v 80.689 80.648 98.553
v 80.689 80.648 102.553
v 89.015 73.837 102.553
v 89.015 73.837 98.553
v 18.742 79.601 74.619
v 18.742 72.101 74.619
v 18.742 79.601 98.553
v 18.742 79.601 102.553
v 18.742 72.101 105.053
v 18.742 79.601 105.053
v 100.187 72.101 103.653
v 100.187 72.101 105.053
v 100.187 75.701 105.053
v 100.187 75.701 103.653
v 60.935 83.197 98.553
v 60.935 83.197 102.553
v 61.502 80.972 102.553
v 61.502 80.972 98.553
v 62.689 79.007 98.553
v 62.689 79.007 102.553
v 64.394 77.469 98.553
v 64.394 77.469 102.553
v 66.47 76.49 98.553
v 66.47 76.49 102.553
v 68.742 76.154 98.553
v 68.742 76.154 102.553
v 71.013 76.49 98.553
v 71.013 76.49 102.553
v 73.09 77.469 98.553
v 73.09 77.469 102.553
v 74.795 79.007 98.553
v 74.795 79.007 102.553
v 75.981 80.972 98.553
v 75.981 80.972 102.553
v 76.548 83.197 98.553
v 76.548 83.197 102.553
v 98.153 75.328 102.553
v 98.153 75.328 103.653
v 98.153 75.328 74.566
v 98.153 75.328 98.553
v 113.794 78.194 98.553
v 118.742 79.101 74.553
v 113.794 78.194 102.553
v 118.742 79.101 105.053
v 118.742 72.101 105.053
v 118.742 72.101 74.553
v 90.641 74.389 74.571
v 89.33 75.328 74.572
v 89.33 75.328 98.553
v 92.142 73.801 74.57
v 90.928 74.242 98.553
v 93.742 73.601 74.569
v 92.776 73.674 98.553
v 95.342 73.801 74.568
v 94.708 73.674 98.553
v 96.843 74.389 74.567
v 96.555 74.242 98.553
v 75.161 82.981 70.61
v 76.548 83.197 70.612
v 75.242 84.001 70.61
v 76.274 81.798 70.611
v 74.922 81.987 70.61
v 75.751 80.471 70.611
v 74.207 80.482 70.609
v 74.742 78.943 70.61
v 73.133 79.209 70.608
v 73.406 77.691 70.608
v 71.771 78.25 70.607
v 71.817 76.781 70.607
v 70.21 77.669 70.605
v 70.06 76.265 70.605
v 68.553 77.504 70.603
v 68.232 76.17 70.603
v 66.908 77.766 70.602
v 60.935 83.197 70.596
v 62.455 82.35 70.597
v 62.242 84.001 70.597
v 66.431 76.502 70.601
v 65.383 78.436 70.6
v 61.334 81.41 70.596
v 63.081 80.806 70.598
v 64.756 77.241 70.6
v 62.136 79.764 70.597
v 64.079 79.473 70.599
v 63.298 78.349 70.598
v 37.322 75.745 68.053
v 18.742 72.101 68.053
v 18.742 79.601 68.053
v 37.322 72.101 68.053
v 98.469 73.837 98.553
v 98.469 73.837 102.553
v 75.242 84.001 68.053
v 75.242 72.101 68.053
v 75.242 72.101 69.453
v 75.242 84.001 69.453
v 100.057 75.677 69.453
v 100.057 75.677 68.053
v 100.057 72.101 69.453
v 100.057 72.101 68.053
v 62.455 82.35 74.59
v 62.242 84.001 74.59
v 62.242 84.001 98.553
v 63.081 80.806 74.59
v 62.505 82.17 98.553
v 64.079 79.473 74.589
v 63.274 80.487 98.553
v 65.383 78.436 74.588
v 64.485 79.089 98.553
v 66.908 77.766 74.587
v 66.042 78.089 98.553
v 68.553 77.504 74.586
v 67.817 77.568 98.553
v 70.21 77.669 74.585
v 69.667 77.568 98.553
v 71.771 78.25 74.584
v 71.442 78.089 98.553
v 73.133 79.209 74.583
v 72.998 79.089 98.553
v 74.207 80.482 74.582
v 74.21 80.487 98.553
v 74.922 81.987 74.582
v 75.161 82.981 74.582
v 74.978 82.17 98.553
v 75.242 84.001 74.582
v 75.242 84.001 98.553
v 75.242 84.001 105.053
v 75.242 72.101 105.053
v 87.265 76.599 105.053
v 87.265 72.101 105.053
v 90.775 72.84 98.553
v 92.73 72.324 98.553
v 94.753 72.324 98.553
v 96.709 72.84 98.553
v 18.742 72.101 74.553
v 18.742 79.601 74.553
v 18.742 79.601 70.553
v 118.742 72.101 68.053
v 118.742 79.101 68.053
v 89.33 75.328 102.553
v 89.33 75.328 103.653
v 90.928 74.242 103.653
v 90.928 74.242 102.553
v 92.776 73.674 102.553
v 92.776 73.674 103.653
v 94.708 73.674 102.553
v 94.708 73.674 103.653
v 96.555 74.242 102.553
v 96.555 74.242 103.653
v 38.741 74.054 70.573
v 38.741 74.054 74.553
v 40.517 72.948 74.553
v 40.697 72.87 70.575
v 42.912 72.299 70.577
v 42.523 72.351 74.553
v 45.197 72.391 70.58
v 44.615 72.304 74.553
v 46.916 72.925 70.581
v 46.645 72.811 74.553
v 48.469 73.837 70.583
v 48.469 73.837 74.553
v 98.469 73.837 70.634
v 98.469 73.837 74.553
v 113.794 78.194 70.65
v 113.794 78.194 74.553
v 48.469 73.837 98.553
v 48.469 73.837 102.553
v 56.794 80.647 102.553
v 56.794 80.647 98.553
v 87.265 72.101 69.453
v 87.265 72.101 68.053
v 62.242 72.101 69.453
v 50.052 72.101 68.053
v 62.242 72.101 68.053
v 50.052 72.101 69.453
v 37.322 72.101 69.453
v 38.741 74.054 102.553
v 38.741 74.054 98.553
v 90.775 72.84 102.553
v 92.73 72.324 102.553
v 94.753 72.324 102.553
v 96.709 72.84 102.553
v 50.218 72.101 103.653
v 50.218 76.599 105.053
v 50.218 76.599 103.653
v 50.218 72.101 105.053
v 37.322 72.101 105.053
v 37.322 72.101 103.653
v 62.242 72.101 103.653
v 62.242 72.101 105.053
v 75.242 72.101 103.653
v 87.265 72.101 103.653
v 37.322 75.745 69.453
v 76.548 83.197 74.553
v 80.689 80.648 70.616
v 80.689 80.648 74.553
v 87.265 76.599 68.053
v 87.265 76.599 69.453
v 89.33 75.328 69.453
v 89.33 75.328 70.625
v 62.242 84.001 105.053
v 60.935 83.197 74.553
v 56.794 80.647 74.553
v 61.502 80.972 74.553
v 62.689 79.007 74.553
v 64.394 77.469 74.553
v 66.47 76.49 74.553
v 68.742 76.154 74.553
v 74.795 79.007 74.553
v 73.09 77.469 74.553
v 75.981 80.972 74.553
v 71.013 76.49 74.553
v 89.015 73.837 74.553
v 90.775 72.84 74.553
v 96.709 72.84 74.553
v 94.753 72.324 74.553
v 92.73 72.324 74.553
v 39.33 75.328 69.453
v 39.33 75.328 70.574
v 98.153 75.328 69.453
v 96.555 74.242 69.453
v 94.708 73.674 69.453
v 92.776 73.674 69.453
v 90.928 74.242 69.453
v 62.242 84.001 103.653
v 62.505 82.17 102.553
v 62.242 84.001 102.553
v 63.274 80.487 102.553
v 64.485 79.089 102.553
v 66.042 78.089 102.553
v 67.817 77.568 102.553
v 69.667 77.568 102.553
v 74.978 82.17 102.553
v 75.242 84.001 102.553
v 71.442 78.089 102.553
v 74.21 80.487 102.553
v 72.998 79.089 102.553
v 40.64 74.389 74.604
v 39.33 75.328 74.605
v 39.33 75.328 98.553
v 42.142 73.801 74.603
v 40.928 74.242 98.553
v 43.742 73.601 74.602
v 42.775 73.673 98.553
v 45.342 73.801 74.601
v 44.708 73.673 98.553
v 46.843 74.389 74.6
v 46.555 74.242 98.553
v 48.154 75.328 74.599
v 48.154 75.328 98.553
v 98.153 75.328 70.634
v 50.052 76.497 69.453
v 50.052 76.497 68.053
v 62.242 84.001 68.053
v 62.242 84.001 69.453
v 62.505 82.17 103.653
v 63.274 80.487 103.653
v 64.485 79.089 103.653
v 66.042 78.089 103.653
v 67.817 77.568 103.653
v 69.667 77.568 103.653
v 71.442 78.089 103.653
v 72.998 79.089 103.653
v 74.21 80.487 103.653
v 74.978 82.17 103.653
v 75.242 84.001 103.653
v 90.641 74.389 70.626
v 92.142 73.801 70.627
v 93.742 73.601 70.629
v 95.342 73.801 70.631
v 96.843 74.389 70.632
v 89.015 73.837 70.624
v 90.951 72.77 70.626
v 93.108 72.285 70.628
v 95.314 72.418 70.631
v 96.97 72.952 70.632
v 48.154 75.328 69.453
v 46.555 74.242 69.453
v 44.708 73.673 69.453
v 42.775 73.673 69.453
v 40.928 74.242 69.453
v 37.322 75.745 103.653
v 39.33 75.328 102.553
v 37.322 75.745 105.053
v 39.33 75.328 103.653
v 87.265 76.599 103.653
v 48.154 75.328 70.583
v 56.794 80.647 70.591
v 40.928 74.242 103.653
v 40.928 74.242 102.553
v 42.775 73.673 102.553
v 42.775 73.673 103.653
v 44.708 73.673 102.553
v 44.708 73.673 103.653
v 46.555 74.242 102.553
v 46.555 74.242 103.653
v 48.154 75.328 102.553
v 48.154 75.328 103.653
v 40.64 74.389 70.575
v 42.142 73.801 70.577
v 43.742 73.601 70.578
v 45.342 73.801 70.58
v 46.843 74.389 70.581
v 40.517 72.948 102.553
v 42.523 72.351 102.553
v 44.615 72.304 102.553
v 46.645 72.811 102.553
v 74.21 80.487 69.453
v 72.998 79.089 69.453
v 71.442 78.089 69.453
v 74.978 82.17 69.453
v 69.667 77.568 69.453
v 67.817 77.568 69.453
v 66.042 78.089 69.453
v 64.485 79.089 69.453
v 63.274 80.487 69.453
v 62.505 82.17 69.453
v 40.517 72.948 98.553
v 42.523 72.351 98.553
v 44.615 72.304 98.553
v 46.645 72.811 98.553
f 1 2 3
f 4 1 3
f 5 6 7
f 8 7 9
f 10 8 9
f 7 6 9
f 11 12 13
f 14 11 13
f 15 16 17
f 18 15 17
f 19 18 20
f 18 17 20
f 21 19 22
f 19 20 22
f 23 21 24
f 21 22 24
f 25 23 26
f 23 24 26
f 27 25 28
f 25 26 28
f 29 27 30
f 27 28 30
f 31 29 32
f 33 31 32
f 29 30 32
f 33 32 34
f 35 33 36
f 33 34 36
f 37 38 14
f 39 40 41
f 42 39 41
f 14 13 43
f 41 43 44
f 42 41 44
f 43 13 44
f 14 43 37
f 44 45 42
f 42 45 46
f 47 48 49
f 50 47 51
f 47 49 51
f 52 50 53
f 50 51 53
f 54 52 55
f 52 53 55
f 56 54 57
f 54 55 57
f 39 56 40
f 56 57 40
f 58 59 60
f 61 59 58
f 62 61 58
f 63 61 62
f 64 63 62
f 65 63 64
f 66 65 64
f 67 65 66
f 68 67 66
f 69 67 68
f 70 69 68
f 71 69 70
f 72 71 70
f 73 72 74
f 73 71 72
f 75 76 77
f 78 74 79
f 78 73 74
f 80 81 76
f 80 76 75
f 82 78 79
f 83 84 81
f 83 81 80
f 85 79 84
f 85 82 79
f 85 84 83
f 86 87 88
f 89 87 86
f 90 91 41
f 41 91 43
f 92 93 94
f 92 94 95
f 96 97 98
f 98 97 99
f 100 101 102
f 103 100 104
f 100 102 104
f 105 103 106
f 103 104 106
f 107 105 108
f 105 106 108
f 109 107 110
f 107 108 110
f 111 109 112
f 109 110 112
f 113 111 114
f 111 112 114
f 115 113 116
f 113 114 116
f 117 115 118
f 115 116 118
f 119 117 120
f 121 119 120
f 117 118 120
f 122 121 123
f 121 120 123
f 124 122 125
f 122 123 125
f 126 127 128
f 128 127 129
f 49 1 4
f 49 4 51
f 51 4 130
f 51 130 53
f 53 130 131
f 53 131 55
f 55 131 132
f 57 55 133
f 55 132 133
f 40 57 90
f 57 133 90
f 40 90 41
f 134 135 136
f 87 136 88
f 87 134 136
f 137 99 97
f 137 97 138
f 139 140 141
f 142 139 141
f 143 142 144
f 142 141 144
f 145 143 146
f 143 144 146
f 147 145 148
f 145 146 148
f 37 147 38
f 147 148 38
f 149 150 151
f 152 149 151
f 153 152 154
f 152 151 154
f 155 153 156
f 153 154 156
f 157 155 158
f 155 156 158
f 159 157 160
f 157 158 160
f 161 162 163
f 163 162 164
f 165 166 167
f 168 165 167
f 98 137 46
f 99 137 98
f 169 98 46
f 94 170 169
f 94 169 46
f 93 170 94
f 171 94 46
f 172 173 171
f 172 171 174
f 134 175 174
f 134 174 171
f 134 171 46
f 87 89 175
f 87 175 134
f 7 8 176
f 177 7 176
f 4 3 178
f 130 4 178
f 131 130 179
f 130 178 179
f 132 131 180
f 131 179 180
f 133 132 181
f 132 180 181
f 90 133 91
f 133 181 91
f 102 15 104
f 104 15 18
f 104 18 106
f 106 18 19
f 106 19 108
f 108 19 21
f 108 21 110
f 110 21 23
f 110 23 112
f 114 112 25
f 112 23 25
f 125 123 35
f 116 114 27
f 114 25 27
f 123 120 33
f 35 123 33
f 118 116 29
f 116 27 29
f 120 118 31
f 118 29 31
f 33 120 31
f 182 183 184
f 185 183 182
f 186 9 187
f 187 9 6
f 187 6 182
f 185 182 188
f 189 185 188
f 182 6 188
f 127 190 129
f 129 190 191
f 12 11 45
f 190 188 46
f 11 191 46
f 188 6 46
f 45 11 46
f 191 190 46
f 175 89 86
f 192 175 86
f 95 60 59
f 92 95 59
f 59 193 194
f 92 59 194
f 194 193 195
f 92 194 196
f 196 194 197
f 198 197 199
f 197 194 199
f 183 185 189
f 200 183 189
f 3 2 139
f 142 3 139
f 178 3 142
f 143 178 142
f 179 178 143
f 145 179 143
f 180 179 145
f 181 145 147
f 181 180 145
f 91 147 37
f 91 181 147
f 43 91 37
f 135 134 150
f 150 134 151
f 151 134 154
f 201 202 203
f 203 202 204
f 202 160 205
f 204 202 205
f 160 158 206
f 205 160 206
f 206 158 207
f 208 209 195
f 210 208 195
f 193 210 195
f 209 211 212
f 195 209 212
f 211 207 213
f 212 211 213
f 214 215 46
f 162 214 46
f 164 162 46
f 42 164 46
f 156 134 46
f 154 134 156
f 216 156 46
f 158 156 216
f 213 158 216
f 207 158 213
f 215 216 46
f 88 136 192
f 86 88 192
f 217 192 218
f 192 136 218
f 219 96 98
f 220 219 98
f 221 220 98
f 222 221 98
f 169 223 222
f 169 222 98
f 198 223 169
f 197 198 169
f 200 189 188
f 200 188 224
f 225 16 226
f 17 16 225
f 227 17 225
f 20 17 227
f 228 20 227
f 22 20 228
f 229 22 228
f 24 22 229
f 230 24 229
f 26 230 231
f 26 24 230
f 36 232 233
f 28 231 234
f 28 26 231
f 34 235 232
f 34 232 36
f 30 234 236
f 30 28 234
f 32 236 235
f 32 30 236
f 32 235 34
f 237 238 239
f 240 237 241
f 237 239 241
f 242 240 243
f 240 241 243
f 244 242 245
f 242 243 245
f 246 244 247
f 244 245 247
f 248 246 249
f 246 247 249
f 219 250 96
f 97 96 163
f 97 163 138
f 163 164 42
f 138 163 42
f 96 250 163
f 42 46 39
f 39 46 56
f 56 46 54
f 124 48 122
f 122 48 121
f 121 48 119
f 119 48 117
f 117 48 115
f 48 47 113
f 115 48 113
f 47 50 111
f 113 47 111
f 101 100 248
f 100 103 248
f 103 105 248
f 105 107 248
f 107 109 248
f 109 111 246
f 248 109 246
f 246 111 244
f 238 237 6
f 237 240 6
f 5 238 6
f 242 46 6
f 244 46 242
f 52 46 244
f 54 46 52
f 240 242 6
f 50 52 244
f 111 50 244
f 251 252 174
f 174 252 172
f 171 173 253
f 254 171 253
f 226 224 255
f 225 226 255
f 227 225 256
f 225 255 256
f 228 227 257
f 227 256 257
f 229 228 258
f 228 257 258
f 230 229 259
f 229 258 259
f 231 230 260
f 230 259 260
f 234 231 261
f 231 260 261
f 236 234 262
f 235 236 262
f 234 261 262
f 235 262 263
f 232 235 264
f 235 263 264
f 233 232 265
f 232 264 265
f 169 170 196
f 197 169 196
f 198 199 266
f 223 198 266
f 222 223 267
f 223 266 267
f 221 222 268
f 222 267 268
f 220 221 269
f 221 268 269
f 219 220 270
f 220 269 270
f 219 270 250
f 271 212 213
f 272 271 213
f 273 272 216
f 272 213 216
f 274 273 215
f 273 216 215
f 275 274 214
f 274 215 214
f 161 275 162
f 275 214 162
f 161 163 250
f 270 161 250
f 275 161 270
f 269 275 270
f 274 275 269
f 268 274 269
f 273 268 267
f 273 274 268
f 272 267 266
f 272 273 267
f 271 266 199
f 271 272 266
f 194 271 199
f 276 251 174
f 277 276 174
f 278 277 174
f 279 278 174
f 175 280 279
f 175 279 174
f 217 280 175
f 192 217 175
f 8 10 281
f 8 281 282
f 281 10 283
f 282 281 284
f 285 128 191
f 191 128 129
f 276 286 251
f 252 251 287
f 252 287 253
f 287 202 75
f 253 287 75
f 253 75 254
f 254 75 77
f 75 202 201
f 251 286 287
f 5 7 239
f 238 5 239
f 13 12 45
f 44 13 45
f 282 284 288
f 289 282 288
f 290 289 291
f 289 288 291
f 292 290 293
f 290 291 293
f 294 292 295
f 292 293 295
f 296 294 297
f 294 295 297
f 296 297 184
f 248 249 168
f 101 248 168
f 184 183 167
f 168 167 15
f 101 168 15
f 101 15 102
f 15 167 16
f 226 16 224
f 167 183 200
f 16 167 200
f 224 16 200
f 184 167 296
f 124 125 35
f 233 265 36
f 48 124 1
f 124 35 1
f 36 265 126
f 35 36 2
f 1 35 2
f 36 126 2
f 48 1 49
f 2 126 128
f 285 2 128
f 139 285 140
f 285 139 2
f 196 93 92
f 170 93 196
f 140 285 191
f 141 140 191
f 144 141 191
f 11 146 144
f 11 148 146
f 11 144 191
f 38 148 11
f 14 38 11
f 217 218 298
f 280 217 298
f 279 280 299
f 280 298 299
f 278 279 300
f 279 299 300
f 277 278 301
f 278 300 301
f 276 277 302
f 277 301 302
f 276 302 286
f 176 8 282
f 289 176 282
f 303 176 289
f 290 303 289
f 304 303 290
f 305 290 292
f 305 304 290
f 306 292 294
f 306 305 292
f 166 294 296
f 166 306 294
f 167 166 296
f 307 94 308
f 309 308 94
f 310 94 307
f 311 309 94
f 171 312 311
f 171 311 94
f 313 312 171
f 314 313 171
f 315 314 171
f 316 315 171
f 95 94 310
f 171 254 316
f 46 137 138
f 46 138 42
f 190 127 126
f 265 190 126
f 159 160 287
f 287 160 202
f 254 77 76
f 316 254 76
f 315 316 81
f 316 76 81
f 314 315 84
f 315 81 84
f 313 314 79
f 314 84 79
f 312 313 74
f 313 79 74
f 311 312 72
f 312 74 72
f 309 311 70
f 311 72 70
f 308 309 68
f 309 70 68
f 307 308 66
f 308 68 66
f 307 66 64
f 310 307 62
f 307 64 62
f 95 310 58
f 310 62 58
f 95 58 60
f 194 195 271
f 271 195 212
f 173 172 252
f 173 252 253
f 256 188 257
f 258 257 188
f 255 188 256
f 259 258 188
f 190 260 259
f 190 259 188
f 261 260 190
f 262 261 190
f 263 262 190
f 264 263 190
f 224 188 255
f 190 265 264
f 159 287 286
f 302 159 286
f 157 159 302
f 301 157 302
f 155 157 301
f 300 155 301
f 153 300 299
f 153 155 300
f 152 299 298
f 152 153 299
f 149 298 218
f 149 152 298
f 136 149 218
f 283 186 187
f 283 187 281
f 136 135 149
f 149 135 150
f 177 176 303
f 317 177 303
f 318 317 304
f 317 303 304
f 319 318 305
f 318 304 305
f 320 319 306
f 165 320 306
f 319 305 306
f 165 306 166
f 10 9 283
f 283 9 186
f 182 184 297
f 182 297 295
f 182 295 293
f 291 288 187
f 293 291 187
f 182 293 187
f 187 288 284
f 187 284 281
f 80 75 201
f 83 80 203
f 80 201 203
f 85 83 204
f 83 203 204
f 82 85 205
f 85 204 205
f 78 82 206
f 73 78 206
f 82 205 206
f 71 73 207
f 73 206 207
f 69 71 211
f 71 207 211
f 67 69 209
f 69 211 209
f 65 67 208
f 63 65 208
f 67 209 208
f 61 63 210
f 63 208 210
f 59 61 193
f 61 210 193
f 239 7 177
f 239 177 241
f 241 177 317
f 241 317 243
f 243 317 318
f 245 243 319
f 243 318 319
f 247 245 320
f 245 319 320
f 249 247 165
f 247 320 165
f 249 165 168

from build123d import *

# Parameters (mm, degrees)
SKETCH_1_W          = 100
SKETCH_1_H          = 4
EXTRUDE_1_DEPTH     = 15
EXTRUDE_1_2_DEPTH   = 15
CUT_EXTRUDE_1_DEPTH = 32
SKETCH_3_W          = 100
SKETCH_3_H          = 2.5
EXTRUDE_2_DEPTH     = 15
CUT_EXTRUDE_5_DEPTH = 37
SKETCH_5_W          = 13
SKETCH_5_H          = 11.9
CUT_EXTRUDE_6_DEPTH = 1.4
SKETCH_6_W          = 13
SKETCH_6_H          = 11.9
CUT_EXTRUDE_7_DEPTH = 1.4


with BuildPart() as part:
    # Эскиз1 → Бобышка-Вытянуть1 (new body)
    with BuildSketch(Plane(origin=(0, 72.101425994, 0), x_dir=(1, 0, 0), z_dir=(0, 1, 0))):
        with Locations((68.741769048, -100.552702475)):
            Rectangle(SKETCH_1_W, SKETCH_1_H)
    extrude(amount=EXTRUDE_1_DEPTH)


with BuildPart() as body_2:
    # Эскиз1 → Extrude 1 2 (new body)
    with BuildSketch(Plane(origin=(0, 72.101425994, 0), x_dir=(1, 0, 0), z_dir=(0, 1, 0))):
        with Locations((68.741769048, -72.552702475)):
            Rectangle(SKETCH_1_W, SKETCH_1_H)
    extrude(amount=EXTRUDE_1_2_DEPTH)


with BuildPart() as cut_extrude_1_tool:
    # Эскиз2 → Вырез-Вытянуть1 (new body)
    with BuildSketch(Plane.XY.offset(102.552702475)):
        with BuildLine():
            Line((18.741769048, 87.101425994), (18.741769048, 79.601425994))
            Line((18.741769048, 79.601425994), (38.7406223, 74.053793994))
            ThreePointArc((38.7406223, 74.053793994), (43.566960712, 72.257224124), (48.468541666, 73.837005729))
            Line((48.468541666, 73.837005729), (60.894137048, 84.001425994))
            ThreePointArc((60.894137048, 84.001425994), (68.741770048, 76.153792994), (76.589403048, 84.001425994))
            Line((76.589403048, 84.001425994), (89.014998431, 73.837005729))
            ThreePointArc((89.014998431, 73.837005729), (93.741770048, 72.25892129), (98.468541666, 73.837005729))
            Line((98.468541666, 73.837005729), (118.741769048, 79.601425994))
            Line((118.741769048, 79.601425994), (118.741769048, 87.101425994))
            Line((118.741769048, 87.101425994), (18.741769048, 87.101425994))
        make_face()
    extrude(amount=-CUT_EXTRUDE_1_DEPTH)


with BuildPart() as part_1:
    add(part.part)

    # Вырез-Вытянуть1: cut by cut_extrude_1_tool
    add(cut_extrude_1_tool.part, mode=Mode.SUBTRACT)



with BuildPart() as body_2_1:
    add(body_2.part)

    # Вырез-Вытянуть1: cut by cut_extrude_1_tool
    add(cut_extrude_1_tool.part, mode=Mode.SUBTRACT)


with BuildPart() as part_2:
    add(part_1.part)

    add(body_2_1.part)  # Бобышка-Вытянуть2 merges body 2
    # Эскиз3 → Бобышка-Вытянуть2 (add)
    with BuildSketch(Plane(origin=(0, 72.101425994, 0), x_dir=(1, 0, 0), z_dir=(0, 1, 0))):
        Polygon((18.741769048, -70.552702475), (18.741769048, -68.052702475), (118.741769048, -68.052702475), (118.741769048, -70.654560826), align=None)
        Polygon((18.741769048, -74.618981064), (18.741769048, -98.552702475), (118.741769048, -98.552702475), (118.741769048, -74.552702475), align=None)
        with Locations((68.741769048, -103.802702475)):
            Rectangle(SKETCH_3_W, SKETCH_3_H)
    extrude(amount=EXTRUDE_2_DEPTH)

    # Эскиз4 → Вырез-Вытянуть5 (cut)
    with BuildSketch(Plane.XY.offset(105.052702475)):
        with BuildLine():
            Line((18.741769048, 79.601425994), (39.329622083, 75.327825775))
            ThreePointArc((39.329622083, 75.327825775), (43.741770048, 73.601094828), (48.153918014, 75.327825775))
            Line((48.153918014, 75.327825775), (62.241769048, 84.001425994))
            ThreePointArc((62.241769048, 84.001425994), (68.741769048, 77.501425994), (75.241769048, 84.001425994))
            Line((75.241769048, 84.001425994), (89.330109389, 75.327825775))
            ThreePointArc((89.330109389, 75.327825775), (93.741769048, 73.601425994), (98.153428707, 75.327825775))
            Line((98.153428707, 75.327825775), (118.741769048, 79.101425994))
            Line((118.741769048, 79.101425994), (118.741769048, 87.101425994))
            Line((118.741769048, 87.101425994), (18.741769048, 87.101425994))
            Line((18.741769048, 87.101425994), (18.741769048, 79.601425994))
        make_face()
    extrude(amount=-CUT_EXTRUDE_5_DEPTH, mode=Mode.SUBTRACT)

    # Эскиз5 → Вырез-Вытянуть6 (cut)
    with BuildSketch(Plane.XY.offset(105.052702475)):
        with Locations((68.741769048, 78.051425994)):
            Rectangle(SKETCH_5_W, SKETCH_5_H)
        Polygon((100.187361471, 80.940674659), (87.265224484, 80.359547889), (87.265224484, 72.101425994), (100.187361471, 72.101425994), align=None)
        Polygon((50.218313612, 80.653123839), (37.321764311, 81.118057283), (37.321764311, 72.101425994), (50.218313612, 72.101425994), align=None)
    extrude(amount=-CUT_EXTRUDE_6_DEPTH, mode=Mode.SUBTRACT)

    # Эскиз6 → Вырез-Вытянуть7 (cut)
    with BuildSketch(Plane(origin=(0, 0, 68.052702475), x_dir=(-1, 0, 0), z_dir=(0, 0, -1))):
        Polygon((-100.057178334, 78.563373472), (-100.057178334, 72.101425994), (-87.265224484, 72.101425994), (-87.265224484, 80.653123839), align=None)
        with Locations((-68.741769048, 78.051425994)):
            Rectangle(SKETCH_6_W, SKETCH_6_H)
        Polygon((-50.05217336, 81.659885945), (-50.05217336, 72.101425994), (-37.321764311, 72.101425994), (-37.321764311, 81.118057283), align=None)
    extrude(amount=-CUT_EXTRUDE_7_DEPTH, mode=Mode.SUBTRACT)


solid = part_2.part
